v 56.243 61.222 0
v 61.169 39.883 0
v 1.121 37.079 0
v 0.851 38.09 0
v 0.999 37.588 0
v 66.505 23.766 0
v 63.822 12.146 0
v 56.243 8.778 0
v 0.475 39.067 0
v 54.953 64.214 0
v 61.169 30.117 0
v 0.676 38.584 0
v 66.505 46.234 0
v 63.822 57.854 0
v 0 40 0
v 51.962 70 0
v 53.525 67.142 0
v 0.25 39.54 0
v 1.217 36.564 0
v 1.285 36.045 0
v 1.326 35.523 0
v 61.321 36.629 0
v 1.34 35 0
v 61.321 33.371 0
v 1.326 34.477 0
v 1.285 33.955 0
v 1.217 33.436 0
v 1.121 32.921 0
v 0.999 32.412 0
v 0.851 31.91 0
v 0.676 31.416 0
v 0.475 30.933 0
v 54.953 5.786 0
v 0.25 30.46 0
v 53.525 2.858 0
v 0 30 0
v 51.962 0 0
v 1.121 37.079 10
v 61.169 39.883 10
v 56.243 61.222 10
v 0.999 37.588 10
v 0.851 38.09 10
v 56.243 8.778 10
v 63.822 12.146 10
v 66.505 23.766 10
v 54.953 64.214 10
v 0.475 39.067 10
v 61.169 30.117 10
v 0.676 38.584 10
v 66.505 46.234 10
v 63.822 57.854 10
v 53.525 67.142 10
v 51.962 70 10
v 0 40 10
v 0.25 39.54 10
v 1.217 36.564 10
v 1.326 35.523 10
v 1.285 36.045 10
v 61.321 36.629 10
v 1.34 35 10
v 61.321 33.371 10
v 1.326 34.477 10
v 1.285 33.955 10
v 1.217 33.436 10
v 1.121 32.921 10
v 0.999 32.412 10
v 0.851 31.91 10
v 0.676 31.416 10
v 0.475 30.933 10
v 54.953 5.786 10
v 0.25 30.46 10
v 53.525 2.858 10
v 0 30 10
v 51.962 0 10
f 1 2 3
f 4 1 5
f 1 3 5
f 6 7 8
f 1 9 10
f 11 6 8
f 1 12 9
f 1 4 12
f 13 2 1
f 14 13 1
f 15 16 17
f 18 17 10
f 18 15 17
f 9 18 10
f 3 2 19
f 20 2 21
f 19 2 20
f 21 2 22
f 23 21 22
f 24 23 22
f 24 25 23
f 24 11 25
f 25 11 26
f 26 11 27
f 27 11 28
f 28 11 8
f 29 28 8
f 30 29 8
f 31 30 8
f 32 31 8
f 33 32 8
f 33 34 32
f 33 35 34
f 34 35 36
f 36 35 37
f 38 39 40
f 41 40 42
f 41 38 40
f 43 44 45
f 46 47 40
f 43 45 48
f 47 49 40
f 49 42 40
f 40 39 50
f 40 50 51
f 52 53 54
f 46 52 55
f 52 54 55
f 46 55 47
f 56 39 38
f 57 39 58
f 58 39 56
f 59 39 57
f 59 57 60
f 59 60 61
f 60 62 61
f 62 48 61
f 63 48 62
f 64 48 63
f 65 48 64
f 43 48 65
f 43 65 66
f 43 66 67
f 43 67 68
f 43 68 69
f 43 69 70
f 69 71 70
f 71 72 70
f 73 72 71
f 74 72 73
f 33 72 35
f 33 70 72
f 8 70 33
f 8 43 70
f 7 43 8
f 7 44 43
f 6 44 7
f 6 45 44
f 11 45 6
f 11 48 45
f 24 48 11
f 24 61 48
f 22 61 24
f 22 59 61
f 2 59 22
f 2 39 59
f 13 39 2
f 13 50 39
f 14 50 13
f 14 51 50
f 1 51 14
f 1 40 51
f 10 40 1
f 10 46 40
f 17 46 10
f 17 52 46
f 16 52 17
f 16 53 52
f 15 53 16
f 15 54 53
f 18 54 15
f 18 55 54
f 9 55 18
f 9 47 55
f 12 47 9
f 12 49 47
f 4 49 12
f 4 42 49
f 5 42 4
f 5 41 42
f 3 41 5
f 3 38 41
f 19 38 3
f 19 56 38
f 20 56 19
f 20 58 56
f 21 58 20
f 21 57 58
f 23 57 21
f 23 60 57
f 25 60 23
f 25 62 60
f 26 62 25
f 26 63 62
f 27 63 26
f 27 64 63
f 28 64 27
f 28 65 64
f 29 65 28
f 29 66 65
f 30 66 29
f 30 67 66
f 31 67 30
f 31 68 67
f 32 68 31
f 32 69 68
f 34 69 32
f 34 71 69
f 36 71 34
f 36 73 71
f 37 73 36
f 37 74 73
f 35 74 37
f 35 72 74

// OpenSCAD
$fn = 32;

// ----------------------------------------------------------------------
// Gear sector: 2 teeth on 60 degrees
// ----------------------------------------------------------------------

// --- parameters (mm) ---
sector_angle = 60;        // sector angle, degrees
root_r = 70;              // root circle radius
tooth_h = 6;              // tooth height over the root circle
teeth = 2;                // number of teeth on the sector
hub_r = 10;               // hub bore radius
plate_t = 10;             // sector thickness, Z
arc_step = 3;             // sampling step of the root/hub arcs, degrees

tip_r = root_r + tooth_h;  // tip circle radius

profile = [[51.962, 0], [53.525, 2.858], [54.953, 5.786], [56.243, 8.778], [63.822, 12.146], [66.505, 23.766], [61.169, 30.117], [61.321, 33.371], [61.321, 36.629], [61.169, 39.883], [66.505, 46.234], [63.822, 57.854], [56.243, 61.222], [54.953, 64.214], [53.525, 67.142], [51.962, 70], [0, 40], [0.25, 39.54], [0.475, 39.067], [0.676, 38.584], [0.851, 38.09], [0.999, 37.588], [1.121, 37.079], [1.217, 36.564], [1.285, 36.045], [1.326, 35.523], [1.34, 35], [1.326, 34.477], [1.285, 33.955], [1.217, 33.436], [1.121, 32.921], [0.999, 32.412], [0.851, 31.91], [0.676, 31.416], [0.475, 30.933], [0.25, 30.46], [0, 30]];  // primary outline, 37 points, counter clockwise

// --- the one profile operation ---
linear_extrude(height = plate_t) polygon(points = profile);
